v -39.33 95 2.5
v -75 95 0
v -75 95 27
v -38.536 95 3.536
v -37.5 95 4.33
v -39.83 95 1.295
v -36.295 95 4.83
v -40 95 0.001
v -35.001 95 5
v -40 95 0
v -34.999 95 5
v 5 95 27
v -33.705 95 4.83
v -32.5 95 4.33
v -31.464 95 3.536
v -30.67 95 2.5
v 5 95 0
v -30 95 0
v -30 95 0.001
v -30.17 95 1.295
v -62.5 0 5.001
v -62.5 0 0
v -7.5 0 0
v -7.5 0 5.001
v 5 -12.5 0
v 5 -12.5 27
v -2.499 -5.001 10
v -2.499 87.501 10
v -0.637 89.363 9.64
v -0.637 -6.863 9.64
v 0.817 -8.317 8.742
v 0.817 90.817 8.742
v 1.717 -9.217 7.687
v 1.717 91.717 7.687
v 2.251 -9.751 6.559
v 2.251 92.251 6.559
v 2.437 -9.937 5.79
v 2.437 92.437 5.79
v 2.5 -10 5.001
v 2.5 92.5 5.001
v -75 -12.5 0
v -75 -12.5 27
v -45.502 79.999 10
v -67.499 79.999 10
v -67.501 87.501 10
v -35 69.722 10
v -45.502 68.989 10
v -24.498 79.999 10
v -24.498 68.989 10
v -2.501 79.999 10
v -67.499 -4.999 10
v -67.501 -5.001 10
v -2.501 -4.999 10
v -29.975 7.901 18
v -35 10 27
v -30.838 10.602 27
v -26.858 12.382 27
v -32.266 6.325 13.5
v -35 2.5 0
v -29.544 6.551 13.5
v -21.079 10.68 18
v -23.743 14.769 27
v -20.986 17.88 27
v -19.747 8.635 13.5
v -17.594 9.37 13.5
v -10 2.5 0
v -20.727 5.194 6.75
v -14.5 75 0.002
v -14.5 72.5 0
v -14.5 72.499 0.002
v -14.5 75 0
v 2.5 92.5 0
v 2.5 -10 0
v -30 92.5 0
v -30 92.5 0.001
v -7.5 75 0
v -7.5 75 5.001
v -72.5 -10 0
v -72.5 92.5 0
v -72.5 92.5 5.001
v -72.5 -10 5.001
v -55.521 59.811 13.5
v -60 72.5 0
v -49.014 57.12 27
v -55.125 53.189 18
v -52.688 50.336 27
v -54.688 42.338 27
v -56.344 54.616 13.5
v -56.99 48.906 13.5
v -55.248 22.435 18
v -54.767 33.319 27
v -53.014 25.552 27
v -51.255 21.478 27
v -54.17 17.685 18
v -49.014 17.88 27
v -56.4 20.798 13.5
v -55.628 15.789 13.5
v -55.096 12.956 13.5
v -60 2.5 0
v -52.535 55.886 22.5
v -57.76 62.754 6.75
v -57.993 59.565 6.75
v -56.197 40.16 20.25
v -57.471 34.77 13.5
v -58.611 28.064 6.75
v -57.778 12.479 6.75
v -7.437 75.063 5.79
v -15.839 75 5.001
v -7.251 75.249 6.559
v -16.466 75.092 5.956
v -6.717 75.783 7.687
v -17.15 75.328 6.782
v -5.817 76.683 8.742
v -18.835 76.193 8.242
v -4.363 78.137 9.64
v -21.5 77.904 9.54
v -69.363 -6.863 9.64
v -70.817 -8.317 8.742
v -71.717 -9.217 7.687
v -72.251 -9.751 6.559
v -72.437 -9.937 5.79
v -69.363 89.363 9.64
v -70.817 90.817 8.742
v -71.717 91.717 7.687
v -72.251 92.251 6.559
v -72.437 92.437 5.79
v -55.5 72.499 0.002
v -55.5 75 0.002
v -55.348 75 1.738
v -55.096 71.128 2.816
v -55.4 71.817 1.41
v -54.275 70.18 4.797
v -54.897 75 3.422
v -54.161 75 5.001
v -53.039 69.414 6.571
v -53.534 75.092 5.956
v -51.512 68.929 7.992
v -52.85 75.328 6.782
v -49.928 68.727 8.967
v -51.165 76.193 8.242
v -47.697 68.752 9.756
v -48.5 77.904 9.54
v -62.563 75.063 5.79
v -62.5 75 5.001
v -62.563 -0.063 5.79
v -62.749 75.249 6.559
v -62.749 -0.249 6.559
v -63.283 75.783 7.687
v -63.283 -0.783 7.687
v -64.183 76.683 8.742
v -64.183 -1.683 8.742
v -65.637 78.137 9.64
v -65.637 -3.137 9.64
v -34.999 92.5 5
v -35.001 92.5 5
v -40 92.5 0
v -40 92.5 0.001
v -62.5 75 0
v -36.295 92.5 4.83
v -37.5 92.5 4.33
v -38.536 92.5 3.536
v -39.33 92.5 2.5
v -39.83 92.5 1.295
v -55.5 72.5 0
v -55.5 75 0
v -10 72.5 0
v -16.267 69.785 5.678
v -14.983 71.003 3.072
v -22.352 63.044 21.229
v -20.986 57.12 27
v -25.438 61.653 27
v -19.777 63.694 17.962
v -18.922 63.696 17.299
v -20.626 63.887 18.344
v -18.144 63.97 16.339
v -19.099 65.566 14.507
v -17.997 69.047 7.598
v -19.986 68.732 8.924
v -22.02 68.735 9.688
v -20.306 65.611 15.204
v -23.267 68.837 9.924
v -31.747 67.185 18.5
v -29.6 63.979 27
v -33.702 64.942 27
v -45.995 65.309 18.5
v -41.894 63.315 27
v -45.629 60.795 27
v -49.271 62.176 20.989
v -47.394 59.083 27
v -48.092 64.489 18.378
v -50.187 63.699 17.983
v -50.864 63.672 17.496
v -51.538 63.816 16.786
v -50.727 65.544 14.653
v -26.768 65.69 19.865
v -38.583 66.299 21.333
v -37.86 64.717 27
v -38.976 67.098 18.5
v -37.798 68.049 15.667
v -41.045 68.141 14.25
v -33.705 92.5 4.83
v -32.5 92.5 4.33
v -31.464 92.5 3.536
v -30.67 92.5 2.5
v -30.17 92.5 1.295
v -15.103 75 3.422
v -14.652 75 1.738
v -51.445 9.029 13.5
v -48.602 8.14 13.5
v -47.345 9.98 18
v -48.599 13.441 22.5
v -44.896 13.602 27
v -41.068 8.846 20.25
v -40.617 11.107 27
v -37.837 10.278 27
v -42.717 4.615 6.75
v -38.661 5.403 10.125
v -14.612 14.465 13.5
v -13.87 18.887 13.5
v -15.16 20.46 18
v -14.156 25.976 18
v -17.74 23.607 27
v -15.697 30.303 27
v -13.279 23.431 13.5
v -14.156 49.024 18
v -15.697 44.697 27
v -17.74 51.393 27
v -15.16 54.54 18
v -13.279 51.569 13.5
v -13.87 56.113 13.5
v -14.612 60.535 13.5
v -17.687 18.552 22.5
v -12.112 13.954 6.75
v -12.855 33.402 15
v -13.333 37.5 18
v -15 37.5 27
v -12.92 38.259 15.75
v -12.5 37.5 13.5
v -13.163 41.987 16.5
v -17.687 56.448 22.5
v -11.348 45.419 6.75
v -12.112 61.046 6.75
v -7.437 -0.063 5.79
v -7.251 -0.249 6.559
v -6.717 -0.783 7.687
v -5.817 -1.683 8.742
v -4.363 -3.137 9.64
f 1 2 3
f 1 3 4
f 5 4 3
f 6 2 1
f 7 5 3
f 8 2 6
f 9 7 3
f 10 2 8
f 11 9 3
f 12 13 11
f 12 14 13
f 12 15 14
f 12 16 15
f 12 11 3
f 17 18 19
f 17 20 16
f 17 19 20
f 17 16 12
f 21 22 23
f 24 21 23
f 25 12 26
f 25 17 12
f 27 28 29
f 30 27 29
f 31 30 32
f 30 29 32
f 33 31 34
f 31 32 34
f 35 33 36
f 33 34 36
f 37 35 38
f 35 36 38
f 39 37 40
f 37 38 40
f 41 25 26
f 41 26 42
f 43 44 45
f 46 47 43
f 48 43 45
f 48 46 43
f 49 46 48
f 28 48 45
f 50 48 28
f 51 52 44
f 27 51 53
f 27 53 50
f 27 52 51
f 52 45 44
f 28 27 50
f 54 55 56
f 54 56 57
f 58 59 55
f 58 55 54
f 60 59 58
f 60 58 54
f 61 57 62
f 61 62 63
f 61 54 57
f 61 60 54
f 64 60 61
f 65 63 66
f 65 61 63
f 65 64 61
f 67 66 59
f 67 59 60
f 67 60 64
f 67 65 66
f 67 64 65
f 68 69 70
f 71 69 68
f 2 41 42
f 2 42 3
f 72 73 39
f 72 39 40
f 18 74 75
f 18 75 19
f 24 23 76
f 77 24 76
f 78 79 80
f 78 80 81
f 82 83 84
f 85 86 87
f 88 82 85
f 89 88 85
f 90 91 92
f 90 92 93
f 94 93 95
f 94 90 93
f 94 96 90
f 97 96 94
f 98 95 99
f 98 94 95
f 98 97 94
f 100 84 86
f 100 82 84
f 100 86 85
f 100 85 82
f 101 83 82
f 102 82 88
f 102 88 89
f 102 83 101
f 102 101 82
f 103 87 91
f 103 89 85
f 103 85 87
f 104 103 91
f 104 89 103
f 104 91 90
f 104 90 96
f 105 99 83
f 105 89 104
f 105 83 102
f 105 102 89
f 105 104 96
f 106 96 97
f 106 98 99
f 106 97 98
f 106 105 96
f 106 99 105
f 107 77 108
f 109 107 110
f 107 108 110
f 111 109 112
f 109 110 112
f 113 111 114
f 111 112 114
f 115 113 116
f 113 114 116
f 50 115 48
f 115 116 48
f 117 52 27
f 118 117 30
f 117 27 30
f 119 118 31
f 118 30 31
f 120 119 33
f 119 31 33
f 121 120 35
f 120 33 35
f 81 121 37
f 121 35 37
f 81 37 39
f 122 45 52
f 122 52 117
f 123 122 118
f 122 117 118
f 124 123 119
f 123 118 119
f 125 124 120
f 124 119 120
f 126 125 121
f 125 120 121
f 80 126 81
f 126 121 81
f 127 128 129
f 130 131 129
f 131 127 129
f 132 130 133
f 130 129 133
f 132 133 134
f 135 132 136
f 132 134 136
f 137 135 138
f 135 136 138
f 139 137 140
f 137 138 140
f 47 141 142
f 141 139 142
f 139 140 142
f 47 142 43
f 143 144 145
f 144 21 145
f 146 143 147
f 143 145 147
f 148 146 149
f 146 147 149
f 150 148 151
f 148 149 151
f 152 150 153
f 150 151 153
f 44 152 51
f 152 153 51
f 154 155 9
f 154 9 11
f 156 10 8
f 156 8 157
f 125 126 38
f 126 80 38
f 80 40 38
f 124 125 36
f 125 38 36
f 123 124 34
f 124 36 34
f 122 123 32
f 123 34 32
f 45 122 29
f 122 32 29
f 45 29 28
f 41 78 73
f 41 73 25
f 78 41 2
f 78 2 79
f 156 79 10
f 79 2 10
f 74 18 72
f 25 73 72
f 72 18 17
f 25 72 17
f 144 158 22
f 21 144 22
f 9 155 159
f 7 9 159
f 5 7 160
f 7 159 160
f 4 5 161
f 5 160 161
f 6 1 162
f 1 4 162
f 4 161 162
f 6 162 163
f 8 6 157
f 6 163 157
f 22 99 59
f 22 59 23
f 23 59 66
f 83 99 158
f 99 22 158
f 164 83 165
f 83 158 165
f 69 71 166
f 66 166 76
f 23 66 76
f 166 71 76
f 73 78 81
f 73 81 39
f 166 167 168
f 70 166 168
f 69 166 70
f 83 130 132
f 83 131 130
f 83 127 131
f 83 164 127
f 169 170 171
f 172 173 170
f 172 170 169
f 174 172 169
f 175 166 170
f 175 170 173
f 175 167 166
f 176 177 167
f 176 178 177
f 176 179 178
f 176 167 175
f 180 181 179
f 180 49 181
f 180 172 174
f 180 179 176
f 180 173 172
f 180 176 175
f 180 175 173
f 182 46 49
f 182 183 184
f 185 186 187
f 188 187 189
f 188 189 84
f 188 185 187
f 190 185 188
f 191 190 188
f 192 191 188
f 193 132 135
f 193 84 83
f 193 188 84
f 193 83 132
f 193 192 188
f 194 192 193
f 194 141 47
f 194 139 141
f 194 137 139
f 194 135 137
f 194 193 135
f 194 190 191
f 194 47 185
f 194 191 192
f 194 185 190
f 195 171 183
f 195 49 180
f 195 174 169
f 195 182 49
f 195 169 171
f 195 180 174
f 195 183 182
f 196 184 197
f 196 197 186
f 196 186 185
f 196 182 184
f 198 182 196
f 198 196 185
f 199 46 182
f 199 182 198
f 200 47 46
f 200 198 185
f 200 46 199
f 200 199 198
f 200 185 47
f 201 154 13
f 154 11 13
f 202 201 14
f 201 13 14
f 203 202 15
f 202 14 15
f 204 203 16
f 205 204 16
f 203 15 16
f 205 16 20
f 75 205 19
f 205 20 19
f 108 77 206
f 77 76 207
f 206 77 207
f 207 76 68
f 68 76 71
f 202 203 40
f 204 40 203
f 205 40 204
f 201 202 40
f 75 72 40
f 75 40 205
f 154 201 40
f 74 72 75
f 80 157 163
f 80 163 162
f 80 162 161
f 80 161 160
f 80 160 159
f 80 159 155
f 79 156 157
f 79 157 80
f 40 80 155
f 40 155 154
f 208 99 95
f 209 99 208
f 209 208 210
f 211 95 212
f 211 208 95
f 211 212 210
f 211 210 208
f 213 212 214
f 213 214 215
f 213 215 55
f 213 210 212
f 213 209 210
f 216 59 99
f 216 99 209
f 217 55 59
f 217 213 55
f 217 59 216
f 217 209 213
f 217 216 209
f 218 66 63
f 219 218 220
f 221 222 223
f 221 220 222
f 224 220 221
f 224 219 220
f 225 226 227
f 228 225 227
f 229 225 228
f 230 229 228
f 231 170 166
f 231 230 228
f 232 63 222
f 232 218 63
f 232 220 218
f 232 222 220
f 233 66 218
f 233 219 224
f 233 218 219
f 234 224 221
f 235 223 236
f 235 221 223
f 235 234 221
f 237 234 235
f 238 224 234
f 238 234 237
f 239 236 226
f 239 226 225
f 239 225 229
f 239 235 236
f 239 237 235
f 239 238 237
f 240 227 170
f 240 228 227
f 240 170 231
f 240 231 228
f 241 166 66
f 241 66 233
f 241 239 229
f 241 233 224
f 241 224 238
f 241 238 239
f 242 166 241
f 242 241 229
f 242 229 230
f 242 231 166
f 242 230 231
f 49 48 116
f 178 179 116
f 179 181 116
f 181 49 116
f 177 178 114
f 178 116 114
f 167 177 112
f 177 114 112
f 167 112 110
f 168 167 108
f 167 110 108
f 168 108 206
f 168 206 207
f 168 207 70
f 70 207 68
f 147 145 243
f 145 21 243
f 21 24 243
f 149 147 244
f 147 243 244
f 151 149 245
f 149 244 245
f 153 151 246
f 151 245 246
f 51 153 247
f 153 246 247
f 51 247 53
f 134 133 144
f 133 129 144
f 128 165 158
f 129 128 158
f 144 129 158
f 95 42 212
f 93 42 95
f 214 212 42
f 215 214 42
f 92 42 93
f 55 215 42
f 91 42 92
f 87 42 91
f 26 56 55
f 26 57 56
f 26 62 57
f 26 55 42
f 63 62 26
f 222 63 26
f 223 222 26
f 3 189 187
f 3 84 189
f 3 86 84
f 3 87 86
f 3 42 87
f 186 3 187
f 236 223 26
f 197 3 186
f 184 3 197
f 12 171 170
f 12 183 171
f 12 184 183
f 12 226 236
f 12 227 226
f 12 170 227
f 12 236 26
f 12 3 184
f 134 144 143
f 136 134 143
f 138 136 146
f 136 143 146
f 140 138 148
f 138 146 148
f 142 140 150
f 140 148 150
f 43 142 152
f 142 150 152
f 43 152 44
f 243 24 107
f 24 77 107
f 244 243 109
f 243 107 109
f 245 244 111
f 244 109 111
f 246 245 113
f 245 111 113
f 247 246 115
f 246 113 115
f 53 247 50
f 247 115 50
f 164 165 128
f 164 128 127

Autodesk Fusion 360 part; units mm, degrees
sketch "Sketch1" plane through (0, 0, 0) normal (0, 0, 1) x (1, 0, 0)
  line L0 (0, 0) -> (-70, 0)
  line L1 (-70, 0) -> (-70, 90)
  line L2 (-70, 90) -> (0, 90)
  line L3 (0, 90) -> (0, 0)
  line L4 (-70, 0) -> (0, 0)
  line L5 (0, 0) -> (0, 10)
  line L6 (0, 10) -> (-70, 10)
  line L7 (-70, 10) -> (-70, 0)
  line L8 (-70, 10) -> (-35, 10)
  line L9 (0, 10) -> (0, 32.5)
  line L10 (-35, 10) -> (-15, 10)
  line L11 (-15, 10) -> (-15, 37.5)
  line L12 (-15, 10) -> (-35, 10)
  line L13 (-35, 10) -> (-35, 37.5)
  line L14 (-35, 37.5) -> (-15, 37.5)
  line L15 (-15, 37.5) -> (-15, 10)
  ellipse E0 centre (-35, 37.5) end of major axis (-35, 10) minor radius 20
  line L16 (-35, 65) -> (-35, 10) construction
  line L17 (-55, 37.5) -> (-15, 37.5) construction
  line L18 (0, 10) -> (-10, 10)
  line L19 (-10, 10) -> (-60, 10)
  line L20 (-60, 10) -> (-60, 72.5)
  line L21 (-60, 72.5) -> (-10, 72.5)
  line L22 (-10, 72.5) -> (-10, 10)
  line L23 (0, 10) -> (-70, 10)
  line L24 (-70, 10) -> (-70, 2.5)
  line L25 (-70, 2.5) -> (0, 2.5)
  line L26 (0, 2.5) -> (0, 10)
  line L27 (0, 2.5) -> (-70, 2.5)
  line L28 (-70, 2.5) -> (-70, -7.5)
  line L29 (-70, -7.5) -> (0, -7.5)
  line L30 (0, -7.5) -> (0, 2.5)
  line L31 (-10, 10) -> (-60, 10)
  line L32 (-60, 10) -> (-60, 2.5)
  line L33 (-60, 2.5) -> (-10, 2.5)
  line L34 (-10, 2.5) -> (-10, 10)
  line L35 (0, -7.5) -> (5, -7.5)
  line L36 (5, -7.5) -> (5, -12.5)
  line L37 (5, -12.5) -> (0, -12.5)
  line L38 (0, -12.5) -> (0, -7.5)
  line L39 (5, -12.5) -> (-75, -12.5)
  line L40 (-75, -12.5) -> (-75, 95)
  line L41 (-75, 95) -> (5, 95)
  line L42 (5, 95) -> (5, -12.5)
  dimension "d1" = 70
  dimension "d2" = 90
  dimension "d3" = 10
  dimension "d4" = 35
  dimension "d5" = 22.5
  dimension "d6" = 20
  dimension "d7" = 27.5
  dimension "d8" = 27.5
  dimension "d11" = 10
  dimension "d12" = 50
  dimension "d13" = 62.5
  dimension "d14" = 70
  dimension "d15" = 7.5
  dimension "d16" = 70
  dimension "d17" = 10
  dimension "d20" = 50
  dimension "d21" = 7.5
  dimension "d22" = 5
  dimension "d23" = 5
  dimension "d24" = 80
  dimension "d25" = 107.5
extrude "Extrude1" add sketch "Sketch1" along normal blind 27 contours L0 L1 L3 L4 L5 L7 L25 L27 L28 L30 L33 | L3 L5 L6 L18 L23 L25 L26 L27 L34 | L1 L6 L7 L8 L23 L24 L25 L27 L32 | L1 L2 L3 L6 L8 L9 L18 L20 L21 L22 L23 | L6 L8 L10 L12 L19 L23 L25 L27 L31 L32 L33 L34 | L6 L8 L11 L15 E0 L19 L20 L21 L22 L23 L31 | L6 L10 L11 L12 L15 E0 L19 L23 L31
extrude "Extrude2" add sketch "Sketch1" along normal blind 27 contours L0 L4 L28 L29 L30
sketch "Sketch2" plane through (0, 0, 27) normal (0, 0, 1) x (-1, 0, 0)
  ellipse E0 centre (35, -37.5) end of major axis (35, -10) minor radius 20
  line L0 (70, -90) -> (70, 7.5)
  line L1 (70, 7.5) -> (0, 7.5)
  line L2 (0, 7.5) -> (0, -90)
  line L3 (0, -90) -> (70, -90)
  ellipse E1 centre (35, -37.5) end of major axis (35, -10) minor radius 20
  line L4 (35, -65) -> (35, -10) construction
  line L5 (55, -37.5) -> (15, -37.5) construction
loft "Loft1" cut profiles "Sketch2", "Sketch1" section 1 contours E0 E1 section 2 contours L6 L8 L10 L12 L19 L23 L25 L27 L31 L32 L33 L34 | L6 L8 L11 L15 E0 L19 L20 L21 L22 L23 L31 | L6 L10 L11 L12 L15 E0 L19 L23 L31
extrude "Extrude3" add sketch "Sketch1" along normal blind 27
sketch "Sketch3" plane through (0, 0, 0) normal (0, 0, -1) x (1, 0, 0)
  line L0 (-75, -95) -> (5, -95)
  line L1 (5, -95) -> (5, 12.5)
  line L2 (5, 12.5) -> (-75, 12.5)
  line L3 (-75, 12.5) -> (-75, -95)
  line L4 (-60, -72.5) -> (-60, -2.5)
  line L5 (-60, -2.5) -> (-10, -2.5)
  line L6 (-10, -2.5) -> (-10, -72.5)
  line L7 (-10, -72.5) -> (-60, -72.5)
sketch "Sketch4" plane through (0, 0, 0) normal (0, 0, -1) x (1, 0, 0)
  line L0 (-75, -95) -> (5, -95)
  line L1 (5, -95) -> (5, 12.5)
  line L2 (5, 12.5) -> (-75, 12.5)
  line L3 (-75, 12.5) -> (-75, -95)
  line L4 (-60, -72.5) -> (-60, -2.5)
  line L5 (-60, -2.5) -> (-10, -2.5)
  line L6 (-10, -2.5) -> (-10, -72.5)
  line L7 (-10, -72.5) -> (-60, -72.5)
  line L8 (-75, 12.5) -> (-72.5, 12.5)
  line L9 (-72.5, 12.5) -> (-72.5, 10)
  line L10 (-72.5, 10) -> (-75, 10)
  line L11 (-75, 10) -> (-75, 12.5)
  line L12 (-60, -2.5) -> (-62.5, -2.5)
  line L13 (-62.5, -2.5) -> (-62.5, 0)
  line L14 (-62.5, 0) -> (-60, 0)
  line L15 (-60, 0) -> (-60, -2.5)
  line L16 (5, 12.5) -> (3.2245, 12.5)
  line L17 (3.2245, 12.5) -> (3.2245, 10)
  line L18 (3.2245, 10) -> (5, 10)
  line L19 (5, 10) -> (5, 12.5)
  line L20 (-62.5, 0) -> (-7.5, 0)
  line L21 (-7.5, 0) -> (-7.5, -75)
  line L22 (-7.5, -75) -> (-62.5, -75)
  line L23 (-62.5, -75) -> (-62.5, 0)
  line L24 (5, -95) -> (2.5, -95)
  line L25 (2.5, -95) -> (2.5, -92.5)
  line L26 (2.5, -92.5) -> (5, -92.5)
  line L27 (5, -92.5) -> (5, -95)
  line L28 (-72.5, 10) -> (2.5, 10)
  line L29 (2.5, 10) -> (2.5, -92.5)
  line L30 (2.5, -92.5) -> (-72.5, -92.5)
  line L31 (-72.5, -92.5) -> (-72.5, 10)
  line L32 (-75, 12.5) -> (5, 12.5)
  line L33 (5, 12.5) -> (5, -95)
  line L34 (5, -95) -> (-75, -95)
  line L35 (-75, -95) -> (-75, 12.5)
  line L36 (-62.5, -75) -> (-55.5, -75)
  line L37 (-7.5, -75) -> (-14.5, -75)
  line L38 (-55.5, -75) -> (-55.5, -72.5)
  line L39 (-14.5, -75) -> (-55.5, -75)
  line L40 (-55.5, -75) -> (-55.5, -72.5)
  line L41 (-55.5, -72.5) -> (-14.5, -72.5)
  line L42 (-14.5, -72.5) -> (-14.5, -75)
  line L43 (-14.5, -75) -> (-55.5, -75)
  line L44 (-55.5, -75) -> (-55.5, -62.3242)
  line L45 (-55.5, -62.3242) -> (-14.5, -62.3242)
  line L46 (-14.5, -62.3242) -> (-14.5, -75)
  line L47 (-30, -95) -> (-40, -95)
  line L48 (-40, -95) -> (-40, -92.5)
  line L49 (-40, -92.5) -> (-30, -92.5)
  line L50 (-30, -92.5) -> (-30, -95)
  dimension "d30" = 2.5
  dimension "d31" = 2.5
  dimension "d32" = 2.5
  dimension "d33" = 2.5
  dimension "d34" = 2.5
  dimension "d35" = 55
  dimension "d36" = 75
  dimension "d37" = 2.5
  dimension "d38" = 2.5
  dimension "d39" = 7
  dimension "d40" = 7
  dimension "d41" = 10
extrude "Extrude4" cut sketch "Sketch4" against normal blind 10 contours L7 L41 L44 L45 L46 | L7 L22 L38 L39 L40 L41 L42 L43 L44 L46
fillet "Fillet1" radius 10 2 edges at (-14.5, 70.9614, 10) (-55.5, 70.9614, 10)
extrude "Extrude5" cut sketch "Sketch4" against normal blind 10 contours L28 L29 L30 L31 L49
fillet "Fillet2" radius 5 9 edges at (2.5, 41.25, 10) (-35, 92.5, 10) (-7.5, 37.5, 10) (-62.5, 37.5, 10) (-72.5, 41.25, 10) (-35, -10, 10) (-35, 0, 10) (-54, 75, 10) (-16, 75, 10)
extrude "Extrude6" cut sketch "Sketch4" against normal blind 5 contours L0 L30 L34 L47 L48 L49 L50
fillet "Fillet3" radius 5 2 edges at (-40, 93.75, 5) (-30, 93.75, 5)
